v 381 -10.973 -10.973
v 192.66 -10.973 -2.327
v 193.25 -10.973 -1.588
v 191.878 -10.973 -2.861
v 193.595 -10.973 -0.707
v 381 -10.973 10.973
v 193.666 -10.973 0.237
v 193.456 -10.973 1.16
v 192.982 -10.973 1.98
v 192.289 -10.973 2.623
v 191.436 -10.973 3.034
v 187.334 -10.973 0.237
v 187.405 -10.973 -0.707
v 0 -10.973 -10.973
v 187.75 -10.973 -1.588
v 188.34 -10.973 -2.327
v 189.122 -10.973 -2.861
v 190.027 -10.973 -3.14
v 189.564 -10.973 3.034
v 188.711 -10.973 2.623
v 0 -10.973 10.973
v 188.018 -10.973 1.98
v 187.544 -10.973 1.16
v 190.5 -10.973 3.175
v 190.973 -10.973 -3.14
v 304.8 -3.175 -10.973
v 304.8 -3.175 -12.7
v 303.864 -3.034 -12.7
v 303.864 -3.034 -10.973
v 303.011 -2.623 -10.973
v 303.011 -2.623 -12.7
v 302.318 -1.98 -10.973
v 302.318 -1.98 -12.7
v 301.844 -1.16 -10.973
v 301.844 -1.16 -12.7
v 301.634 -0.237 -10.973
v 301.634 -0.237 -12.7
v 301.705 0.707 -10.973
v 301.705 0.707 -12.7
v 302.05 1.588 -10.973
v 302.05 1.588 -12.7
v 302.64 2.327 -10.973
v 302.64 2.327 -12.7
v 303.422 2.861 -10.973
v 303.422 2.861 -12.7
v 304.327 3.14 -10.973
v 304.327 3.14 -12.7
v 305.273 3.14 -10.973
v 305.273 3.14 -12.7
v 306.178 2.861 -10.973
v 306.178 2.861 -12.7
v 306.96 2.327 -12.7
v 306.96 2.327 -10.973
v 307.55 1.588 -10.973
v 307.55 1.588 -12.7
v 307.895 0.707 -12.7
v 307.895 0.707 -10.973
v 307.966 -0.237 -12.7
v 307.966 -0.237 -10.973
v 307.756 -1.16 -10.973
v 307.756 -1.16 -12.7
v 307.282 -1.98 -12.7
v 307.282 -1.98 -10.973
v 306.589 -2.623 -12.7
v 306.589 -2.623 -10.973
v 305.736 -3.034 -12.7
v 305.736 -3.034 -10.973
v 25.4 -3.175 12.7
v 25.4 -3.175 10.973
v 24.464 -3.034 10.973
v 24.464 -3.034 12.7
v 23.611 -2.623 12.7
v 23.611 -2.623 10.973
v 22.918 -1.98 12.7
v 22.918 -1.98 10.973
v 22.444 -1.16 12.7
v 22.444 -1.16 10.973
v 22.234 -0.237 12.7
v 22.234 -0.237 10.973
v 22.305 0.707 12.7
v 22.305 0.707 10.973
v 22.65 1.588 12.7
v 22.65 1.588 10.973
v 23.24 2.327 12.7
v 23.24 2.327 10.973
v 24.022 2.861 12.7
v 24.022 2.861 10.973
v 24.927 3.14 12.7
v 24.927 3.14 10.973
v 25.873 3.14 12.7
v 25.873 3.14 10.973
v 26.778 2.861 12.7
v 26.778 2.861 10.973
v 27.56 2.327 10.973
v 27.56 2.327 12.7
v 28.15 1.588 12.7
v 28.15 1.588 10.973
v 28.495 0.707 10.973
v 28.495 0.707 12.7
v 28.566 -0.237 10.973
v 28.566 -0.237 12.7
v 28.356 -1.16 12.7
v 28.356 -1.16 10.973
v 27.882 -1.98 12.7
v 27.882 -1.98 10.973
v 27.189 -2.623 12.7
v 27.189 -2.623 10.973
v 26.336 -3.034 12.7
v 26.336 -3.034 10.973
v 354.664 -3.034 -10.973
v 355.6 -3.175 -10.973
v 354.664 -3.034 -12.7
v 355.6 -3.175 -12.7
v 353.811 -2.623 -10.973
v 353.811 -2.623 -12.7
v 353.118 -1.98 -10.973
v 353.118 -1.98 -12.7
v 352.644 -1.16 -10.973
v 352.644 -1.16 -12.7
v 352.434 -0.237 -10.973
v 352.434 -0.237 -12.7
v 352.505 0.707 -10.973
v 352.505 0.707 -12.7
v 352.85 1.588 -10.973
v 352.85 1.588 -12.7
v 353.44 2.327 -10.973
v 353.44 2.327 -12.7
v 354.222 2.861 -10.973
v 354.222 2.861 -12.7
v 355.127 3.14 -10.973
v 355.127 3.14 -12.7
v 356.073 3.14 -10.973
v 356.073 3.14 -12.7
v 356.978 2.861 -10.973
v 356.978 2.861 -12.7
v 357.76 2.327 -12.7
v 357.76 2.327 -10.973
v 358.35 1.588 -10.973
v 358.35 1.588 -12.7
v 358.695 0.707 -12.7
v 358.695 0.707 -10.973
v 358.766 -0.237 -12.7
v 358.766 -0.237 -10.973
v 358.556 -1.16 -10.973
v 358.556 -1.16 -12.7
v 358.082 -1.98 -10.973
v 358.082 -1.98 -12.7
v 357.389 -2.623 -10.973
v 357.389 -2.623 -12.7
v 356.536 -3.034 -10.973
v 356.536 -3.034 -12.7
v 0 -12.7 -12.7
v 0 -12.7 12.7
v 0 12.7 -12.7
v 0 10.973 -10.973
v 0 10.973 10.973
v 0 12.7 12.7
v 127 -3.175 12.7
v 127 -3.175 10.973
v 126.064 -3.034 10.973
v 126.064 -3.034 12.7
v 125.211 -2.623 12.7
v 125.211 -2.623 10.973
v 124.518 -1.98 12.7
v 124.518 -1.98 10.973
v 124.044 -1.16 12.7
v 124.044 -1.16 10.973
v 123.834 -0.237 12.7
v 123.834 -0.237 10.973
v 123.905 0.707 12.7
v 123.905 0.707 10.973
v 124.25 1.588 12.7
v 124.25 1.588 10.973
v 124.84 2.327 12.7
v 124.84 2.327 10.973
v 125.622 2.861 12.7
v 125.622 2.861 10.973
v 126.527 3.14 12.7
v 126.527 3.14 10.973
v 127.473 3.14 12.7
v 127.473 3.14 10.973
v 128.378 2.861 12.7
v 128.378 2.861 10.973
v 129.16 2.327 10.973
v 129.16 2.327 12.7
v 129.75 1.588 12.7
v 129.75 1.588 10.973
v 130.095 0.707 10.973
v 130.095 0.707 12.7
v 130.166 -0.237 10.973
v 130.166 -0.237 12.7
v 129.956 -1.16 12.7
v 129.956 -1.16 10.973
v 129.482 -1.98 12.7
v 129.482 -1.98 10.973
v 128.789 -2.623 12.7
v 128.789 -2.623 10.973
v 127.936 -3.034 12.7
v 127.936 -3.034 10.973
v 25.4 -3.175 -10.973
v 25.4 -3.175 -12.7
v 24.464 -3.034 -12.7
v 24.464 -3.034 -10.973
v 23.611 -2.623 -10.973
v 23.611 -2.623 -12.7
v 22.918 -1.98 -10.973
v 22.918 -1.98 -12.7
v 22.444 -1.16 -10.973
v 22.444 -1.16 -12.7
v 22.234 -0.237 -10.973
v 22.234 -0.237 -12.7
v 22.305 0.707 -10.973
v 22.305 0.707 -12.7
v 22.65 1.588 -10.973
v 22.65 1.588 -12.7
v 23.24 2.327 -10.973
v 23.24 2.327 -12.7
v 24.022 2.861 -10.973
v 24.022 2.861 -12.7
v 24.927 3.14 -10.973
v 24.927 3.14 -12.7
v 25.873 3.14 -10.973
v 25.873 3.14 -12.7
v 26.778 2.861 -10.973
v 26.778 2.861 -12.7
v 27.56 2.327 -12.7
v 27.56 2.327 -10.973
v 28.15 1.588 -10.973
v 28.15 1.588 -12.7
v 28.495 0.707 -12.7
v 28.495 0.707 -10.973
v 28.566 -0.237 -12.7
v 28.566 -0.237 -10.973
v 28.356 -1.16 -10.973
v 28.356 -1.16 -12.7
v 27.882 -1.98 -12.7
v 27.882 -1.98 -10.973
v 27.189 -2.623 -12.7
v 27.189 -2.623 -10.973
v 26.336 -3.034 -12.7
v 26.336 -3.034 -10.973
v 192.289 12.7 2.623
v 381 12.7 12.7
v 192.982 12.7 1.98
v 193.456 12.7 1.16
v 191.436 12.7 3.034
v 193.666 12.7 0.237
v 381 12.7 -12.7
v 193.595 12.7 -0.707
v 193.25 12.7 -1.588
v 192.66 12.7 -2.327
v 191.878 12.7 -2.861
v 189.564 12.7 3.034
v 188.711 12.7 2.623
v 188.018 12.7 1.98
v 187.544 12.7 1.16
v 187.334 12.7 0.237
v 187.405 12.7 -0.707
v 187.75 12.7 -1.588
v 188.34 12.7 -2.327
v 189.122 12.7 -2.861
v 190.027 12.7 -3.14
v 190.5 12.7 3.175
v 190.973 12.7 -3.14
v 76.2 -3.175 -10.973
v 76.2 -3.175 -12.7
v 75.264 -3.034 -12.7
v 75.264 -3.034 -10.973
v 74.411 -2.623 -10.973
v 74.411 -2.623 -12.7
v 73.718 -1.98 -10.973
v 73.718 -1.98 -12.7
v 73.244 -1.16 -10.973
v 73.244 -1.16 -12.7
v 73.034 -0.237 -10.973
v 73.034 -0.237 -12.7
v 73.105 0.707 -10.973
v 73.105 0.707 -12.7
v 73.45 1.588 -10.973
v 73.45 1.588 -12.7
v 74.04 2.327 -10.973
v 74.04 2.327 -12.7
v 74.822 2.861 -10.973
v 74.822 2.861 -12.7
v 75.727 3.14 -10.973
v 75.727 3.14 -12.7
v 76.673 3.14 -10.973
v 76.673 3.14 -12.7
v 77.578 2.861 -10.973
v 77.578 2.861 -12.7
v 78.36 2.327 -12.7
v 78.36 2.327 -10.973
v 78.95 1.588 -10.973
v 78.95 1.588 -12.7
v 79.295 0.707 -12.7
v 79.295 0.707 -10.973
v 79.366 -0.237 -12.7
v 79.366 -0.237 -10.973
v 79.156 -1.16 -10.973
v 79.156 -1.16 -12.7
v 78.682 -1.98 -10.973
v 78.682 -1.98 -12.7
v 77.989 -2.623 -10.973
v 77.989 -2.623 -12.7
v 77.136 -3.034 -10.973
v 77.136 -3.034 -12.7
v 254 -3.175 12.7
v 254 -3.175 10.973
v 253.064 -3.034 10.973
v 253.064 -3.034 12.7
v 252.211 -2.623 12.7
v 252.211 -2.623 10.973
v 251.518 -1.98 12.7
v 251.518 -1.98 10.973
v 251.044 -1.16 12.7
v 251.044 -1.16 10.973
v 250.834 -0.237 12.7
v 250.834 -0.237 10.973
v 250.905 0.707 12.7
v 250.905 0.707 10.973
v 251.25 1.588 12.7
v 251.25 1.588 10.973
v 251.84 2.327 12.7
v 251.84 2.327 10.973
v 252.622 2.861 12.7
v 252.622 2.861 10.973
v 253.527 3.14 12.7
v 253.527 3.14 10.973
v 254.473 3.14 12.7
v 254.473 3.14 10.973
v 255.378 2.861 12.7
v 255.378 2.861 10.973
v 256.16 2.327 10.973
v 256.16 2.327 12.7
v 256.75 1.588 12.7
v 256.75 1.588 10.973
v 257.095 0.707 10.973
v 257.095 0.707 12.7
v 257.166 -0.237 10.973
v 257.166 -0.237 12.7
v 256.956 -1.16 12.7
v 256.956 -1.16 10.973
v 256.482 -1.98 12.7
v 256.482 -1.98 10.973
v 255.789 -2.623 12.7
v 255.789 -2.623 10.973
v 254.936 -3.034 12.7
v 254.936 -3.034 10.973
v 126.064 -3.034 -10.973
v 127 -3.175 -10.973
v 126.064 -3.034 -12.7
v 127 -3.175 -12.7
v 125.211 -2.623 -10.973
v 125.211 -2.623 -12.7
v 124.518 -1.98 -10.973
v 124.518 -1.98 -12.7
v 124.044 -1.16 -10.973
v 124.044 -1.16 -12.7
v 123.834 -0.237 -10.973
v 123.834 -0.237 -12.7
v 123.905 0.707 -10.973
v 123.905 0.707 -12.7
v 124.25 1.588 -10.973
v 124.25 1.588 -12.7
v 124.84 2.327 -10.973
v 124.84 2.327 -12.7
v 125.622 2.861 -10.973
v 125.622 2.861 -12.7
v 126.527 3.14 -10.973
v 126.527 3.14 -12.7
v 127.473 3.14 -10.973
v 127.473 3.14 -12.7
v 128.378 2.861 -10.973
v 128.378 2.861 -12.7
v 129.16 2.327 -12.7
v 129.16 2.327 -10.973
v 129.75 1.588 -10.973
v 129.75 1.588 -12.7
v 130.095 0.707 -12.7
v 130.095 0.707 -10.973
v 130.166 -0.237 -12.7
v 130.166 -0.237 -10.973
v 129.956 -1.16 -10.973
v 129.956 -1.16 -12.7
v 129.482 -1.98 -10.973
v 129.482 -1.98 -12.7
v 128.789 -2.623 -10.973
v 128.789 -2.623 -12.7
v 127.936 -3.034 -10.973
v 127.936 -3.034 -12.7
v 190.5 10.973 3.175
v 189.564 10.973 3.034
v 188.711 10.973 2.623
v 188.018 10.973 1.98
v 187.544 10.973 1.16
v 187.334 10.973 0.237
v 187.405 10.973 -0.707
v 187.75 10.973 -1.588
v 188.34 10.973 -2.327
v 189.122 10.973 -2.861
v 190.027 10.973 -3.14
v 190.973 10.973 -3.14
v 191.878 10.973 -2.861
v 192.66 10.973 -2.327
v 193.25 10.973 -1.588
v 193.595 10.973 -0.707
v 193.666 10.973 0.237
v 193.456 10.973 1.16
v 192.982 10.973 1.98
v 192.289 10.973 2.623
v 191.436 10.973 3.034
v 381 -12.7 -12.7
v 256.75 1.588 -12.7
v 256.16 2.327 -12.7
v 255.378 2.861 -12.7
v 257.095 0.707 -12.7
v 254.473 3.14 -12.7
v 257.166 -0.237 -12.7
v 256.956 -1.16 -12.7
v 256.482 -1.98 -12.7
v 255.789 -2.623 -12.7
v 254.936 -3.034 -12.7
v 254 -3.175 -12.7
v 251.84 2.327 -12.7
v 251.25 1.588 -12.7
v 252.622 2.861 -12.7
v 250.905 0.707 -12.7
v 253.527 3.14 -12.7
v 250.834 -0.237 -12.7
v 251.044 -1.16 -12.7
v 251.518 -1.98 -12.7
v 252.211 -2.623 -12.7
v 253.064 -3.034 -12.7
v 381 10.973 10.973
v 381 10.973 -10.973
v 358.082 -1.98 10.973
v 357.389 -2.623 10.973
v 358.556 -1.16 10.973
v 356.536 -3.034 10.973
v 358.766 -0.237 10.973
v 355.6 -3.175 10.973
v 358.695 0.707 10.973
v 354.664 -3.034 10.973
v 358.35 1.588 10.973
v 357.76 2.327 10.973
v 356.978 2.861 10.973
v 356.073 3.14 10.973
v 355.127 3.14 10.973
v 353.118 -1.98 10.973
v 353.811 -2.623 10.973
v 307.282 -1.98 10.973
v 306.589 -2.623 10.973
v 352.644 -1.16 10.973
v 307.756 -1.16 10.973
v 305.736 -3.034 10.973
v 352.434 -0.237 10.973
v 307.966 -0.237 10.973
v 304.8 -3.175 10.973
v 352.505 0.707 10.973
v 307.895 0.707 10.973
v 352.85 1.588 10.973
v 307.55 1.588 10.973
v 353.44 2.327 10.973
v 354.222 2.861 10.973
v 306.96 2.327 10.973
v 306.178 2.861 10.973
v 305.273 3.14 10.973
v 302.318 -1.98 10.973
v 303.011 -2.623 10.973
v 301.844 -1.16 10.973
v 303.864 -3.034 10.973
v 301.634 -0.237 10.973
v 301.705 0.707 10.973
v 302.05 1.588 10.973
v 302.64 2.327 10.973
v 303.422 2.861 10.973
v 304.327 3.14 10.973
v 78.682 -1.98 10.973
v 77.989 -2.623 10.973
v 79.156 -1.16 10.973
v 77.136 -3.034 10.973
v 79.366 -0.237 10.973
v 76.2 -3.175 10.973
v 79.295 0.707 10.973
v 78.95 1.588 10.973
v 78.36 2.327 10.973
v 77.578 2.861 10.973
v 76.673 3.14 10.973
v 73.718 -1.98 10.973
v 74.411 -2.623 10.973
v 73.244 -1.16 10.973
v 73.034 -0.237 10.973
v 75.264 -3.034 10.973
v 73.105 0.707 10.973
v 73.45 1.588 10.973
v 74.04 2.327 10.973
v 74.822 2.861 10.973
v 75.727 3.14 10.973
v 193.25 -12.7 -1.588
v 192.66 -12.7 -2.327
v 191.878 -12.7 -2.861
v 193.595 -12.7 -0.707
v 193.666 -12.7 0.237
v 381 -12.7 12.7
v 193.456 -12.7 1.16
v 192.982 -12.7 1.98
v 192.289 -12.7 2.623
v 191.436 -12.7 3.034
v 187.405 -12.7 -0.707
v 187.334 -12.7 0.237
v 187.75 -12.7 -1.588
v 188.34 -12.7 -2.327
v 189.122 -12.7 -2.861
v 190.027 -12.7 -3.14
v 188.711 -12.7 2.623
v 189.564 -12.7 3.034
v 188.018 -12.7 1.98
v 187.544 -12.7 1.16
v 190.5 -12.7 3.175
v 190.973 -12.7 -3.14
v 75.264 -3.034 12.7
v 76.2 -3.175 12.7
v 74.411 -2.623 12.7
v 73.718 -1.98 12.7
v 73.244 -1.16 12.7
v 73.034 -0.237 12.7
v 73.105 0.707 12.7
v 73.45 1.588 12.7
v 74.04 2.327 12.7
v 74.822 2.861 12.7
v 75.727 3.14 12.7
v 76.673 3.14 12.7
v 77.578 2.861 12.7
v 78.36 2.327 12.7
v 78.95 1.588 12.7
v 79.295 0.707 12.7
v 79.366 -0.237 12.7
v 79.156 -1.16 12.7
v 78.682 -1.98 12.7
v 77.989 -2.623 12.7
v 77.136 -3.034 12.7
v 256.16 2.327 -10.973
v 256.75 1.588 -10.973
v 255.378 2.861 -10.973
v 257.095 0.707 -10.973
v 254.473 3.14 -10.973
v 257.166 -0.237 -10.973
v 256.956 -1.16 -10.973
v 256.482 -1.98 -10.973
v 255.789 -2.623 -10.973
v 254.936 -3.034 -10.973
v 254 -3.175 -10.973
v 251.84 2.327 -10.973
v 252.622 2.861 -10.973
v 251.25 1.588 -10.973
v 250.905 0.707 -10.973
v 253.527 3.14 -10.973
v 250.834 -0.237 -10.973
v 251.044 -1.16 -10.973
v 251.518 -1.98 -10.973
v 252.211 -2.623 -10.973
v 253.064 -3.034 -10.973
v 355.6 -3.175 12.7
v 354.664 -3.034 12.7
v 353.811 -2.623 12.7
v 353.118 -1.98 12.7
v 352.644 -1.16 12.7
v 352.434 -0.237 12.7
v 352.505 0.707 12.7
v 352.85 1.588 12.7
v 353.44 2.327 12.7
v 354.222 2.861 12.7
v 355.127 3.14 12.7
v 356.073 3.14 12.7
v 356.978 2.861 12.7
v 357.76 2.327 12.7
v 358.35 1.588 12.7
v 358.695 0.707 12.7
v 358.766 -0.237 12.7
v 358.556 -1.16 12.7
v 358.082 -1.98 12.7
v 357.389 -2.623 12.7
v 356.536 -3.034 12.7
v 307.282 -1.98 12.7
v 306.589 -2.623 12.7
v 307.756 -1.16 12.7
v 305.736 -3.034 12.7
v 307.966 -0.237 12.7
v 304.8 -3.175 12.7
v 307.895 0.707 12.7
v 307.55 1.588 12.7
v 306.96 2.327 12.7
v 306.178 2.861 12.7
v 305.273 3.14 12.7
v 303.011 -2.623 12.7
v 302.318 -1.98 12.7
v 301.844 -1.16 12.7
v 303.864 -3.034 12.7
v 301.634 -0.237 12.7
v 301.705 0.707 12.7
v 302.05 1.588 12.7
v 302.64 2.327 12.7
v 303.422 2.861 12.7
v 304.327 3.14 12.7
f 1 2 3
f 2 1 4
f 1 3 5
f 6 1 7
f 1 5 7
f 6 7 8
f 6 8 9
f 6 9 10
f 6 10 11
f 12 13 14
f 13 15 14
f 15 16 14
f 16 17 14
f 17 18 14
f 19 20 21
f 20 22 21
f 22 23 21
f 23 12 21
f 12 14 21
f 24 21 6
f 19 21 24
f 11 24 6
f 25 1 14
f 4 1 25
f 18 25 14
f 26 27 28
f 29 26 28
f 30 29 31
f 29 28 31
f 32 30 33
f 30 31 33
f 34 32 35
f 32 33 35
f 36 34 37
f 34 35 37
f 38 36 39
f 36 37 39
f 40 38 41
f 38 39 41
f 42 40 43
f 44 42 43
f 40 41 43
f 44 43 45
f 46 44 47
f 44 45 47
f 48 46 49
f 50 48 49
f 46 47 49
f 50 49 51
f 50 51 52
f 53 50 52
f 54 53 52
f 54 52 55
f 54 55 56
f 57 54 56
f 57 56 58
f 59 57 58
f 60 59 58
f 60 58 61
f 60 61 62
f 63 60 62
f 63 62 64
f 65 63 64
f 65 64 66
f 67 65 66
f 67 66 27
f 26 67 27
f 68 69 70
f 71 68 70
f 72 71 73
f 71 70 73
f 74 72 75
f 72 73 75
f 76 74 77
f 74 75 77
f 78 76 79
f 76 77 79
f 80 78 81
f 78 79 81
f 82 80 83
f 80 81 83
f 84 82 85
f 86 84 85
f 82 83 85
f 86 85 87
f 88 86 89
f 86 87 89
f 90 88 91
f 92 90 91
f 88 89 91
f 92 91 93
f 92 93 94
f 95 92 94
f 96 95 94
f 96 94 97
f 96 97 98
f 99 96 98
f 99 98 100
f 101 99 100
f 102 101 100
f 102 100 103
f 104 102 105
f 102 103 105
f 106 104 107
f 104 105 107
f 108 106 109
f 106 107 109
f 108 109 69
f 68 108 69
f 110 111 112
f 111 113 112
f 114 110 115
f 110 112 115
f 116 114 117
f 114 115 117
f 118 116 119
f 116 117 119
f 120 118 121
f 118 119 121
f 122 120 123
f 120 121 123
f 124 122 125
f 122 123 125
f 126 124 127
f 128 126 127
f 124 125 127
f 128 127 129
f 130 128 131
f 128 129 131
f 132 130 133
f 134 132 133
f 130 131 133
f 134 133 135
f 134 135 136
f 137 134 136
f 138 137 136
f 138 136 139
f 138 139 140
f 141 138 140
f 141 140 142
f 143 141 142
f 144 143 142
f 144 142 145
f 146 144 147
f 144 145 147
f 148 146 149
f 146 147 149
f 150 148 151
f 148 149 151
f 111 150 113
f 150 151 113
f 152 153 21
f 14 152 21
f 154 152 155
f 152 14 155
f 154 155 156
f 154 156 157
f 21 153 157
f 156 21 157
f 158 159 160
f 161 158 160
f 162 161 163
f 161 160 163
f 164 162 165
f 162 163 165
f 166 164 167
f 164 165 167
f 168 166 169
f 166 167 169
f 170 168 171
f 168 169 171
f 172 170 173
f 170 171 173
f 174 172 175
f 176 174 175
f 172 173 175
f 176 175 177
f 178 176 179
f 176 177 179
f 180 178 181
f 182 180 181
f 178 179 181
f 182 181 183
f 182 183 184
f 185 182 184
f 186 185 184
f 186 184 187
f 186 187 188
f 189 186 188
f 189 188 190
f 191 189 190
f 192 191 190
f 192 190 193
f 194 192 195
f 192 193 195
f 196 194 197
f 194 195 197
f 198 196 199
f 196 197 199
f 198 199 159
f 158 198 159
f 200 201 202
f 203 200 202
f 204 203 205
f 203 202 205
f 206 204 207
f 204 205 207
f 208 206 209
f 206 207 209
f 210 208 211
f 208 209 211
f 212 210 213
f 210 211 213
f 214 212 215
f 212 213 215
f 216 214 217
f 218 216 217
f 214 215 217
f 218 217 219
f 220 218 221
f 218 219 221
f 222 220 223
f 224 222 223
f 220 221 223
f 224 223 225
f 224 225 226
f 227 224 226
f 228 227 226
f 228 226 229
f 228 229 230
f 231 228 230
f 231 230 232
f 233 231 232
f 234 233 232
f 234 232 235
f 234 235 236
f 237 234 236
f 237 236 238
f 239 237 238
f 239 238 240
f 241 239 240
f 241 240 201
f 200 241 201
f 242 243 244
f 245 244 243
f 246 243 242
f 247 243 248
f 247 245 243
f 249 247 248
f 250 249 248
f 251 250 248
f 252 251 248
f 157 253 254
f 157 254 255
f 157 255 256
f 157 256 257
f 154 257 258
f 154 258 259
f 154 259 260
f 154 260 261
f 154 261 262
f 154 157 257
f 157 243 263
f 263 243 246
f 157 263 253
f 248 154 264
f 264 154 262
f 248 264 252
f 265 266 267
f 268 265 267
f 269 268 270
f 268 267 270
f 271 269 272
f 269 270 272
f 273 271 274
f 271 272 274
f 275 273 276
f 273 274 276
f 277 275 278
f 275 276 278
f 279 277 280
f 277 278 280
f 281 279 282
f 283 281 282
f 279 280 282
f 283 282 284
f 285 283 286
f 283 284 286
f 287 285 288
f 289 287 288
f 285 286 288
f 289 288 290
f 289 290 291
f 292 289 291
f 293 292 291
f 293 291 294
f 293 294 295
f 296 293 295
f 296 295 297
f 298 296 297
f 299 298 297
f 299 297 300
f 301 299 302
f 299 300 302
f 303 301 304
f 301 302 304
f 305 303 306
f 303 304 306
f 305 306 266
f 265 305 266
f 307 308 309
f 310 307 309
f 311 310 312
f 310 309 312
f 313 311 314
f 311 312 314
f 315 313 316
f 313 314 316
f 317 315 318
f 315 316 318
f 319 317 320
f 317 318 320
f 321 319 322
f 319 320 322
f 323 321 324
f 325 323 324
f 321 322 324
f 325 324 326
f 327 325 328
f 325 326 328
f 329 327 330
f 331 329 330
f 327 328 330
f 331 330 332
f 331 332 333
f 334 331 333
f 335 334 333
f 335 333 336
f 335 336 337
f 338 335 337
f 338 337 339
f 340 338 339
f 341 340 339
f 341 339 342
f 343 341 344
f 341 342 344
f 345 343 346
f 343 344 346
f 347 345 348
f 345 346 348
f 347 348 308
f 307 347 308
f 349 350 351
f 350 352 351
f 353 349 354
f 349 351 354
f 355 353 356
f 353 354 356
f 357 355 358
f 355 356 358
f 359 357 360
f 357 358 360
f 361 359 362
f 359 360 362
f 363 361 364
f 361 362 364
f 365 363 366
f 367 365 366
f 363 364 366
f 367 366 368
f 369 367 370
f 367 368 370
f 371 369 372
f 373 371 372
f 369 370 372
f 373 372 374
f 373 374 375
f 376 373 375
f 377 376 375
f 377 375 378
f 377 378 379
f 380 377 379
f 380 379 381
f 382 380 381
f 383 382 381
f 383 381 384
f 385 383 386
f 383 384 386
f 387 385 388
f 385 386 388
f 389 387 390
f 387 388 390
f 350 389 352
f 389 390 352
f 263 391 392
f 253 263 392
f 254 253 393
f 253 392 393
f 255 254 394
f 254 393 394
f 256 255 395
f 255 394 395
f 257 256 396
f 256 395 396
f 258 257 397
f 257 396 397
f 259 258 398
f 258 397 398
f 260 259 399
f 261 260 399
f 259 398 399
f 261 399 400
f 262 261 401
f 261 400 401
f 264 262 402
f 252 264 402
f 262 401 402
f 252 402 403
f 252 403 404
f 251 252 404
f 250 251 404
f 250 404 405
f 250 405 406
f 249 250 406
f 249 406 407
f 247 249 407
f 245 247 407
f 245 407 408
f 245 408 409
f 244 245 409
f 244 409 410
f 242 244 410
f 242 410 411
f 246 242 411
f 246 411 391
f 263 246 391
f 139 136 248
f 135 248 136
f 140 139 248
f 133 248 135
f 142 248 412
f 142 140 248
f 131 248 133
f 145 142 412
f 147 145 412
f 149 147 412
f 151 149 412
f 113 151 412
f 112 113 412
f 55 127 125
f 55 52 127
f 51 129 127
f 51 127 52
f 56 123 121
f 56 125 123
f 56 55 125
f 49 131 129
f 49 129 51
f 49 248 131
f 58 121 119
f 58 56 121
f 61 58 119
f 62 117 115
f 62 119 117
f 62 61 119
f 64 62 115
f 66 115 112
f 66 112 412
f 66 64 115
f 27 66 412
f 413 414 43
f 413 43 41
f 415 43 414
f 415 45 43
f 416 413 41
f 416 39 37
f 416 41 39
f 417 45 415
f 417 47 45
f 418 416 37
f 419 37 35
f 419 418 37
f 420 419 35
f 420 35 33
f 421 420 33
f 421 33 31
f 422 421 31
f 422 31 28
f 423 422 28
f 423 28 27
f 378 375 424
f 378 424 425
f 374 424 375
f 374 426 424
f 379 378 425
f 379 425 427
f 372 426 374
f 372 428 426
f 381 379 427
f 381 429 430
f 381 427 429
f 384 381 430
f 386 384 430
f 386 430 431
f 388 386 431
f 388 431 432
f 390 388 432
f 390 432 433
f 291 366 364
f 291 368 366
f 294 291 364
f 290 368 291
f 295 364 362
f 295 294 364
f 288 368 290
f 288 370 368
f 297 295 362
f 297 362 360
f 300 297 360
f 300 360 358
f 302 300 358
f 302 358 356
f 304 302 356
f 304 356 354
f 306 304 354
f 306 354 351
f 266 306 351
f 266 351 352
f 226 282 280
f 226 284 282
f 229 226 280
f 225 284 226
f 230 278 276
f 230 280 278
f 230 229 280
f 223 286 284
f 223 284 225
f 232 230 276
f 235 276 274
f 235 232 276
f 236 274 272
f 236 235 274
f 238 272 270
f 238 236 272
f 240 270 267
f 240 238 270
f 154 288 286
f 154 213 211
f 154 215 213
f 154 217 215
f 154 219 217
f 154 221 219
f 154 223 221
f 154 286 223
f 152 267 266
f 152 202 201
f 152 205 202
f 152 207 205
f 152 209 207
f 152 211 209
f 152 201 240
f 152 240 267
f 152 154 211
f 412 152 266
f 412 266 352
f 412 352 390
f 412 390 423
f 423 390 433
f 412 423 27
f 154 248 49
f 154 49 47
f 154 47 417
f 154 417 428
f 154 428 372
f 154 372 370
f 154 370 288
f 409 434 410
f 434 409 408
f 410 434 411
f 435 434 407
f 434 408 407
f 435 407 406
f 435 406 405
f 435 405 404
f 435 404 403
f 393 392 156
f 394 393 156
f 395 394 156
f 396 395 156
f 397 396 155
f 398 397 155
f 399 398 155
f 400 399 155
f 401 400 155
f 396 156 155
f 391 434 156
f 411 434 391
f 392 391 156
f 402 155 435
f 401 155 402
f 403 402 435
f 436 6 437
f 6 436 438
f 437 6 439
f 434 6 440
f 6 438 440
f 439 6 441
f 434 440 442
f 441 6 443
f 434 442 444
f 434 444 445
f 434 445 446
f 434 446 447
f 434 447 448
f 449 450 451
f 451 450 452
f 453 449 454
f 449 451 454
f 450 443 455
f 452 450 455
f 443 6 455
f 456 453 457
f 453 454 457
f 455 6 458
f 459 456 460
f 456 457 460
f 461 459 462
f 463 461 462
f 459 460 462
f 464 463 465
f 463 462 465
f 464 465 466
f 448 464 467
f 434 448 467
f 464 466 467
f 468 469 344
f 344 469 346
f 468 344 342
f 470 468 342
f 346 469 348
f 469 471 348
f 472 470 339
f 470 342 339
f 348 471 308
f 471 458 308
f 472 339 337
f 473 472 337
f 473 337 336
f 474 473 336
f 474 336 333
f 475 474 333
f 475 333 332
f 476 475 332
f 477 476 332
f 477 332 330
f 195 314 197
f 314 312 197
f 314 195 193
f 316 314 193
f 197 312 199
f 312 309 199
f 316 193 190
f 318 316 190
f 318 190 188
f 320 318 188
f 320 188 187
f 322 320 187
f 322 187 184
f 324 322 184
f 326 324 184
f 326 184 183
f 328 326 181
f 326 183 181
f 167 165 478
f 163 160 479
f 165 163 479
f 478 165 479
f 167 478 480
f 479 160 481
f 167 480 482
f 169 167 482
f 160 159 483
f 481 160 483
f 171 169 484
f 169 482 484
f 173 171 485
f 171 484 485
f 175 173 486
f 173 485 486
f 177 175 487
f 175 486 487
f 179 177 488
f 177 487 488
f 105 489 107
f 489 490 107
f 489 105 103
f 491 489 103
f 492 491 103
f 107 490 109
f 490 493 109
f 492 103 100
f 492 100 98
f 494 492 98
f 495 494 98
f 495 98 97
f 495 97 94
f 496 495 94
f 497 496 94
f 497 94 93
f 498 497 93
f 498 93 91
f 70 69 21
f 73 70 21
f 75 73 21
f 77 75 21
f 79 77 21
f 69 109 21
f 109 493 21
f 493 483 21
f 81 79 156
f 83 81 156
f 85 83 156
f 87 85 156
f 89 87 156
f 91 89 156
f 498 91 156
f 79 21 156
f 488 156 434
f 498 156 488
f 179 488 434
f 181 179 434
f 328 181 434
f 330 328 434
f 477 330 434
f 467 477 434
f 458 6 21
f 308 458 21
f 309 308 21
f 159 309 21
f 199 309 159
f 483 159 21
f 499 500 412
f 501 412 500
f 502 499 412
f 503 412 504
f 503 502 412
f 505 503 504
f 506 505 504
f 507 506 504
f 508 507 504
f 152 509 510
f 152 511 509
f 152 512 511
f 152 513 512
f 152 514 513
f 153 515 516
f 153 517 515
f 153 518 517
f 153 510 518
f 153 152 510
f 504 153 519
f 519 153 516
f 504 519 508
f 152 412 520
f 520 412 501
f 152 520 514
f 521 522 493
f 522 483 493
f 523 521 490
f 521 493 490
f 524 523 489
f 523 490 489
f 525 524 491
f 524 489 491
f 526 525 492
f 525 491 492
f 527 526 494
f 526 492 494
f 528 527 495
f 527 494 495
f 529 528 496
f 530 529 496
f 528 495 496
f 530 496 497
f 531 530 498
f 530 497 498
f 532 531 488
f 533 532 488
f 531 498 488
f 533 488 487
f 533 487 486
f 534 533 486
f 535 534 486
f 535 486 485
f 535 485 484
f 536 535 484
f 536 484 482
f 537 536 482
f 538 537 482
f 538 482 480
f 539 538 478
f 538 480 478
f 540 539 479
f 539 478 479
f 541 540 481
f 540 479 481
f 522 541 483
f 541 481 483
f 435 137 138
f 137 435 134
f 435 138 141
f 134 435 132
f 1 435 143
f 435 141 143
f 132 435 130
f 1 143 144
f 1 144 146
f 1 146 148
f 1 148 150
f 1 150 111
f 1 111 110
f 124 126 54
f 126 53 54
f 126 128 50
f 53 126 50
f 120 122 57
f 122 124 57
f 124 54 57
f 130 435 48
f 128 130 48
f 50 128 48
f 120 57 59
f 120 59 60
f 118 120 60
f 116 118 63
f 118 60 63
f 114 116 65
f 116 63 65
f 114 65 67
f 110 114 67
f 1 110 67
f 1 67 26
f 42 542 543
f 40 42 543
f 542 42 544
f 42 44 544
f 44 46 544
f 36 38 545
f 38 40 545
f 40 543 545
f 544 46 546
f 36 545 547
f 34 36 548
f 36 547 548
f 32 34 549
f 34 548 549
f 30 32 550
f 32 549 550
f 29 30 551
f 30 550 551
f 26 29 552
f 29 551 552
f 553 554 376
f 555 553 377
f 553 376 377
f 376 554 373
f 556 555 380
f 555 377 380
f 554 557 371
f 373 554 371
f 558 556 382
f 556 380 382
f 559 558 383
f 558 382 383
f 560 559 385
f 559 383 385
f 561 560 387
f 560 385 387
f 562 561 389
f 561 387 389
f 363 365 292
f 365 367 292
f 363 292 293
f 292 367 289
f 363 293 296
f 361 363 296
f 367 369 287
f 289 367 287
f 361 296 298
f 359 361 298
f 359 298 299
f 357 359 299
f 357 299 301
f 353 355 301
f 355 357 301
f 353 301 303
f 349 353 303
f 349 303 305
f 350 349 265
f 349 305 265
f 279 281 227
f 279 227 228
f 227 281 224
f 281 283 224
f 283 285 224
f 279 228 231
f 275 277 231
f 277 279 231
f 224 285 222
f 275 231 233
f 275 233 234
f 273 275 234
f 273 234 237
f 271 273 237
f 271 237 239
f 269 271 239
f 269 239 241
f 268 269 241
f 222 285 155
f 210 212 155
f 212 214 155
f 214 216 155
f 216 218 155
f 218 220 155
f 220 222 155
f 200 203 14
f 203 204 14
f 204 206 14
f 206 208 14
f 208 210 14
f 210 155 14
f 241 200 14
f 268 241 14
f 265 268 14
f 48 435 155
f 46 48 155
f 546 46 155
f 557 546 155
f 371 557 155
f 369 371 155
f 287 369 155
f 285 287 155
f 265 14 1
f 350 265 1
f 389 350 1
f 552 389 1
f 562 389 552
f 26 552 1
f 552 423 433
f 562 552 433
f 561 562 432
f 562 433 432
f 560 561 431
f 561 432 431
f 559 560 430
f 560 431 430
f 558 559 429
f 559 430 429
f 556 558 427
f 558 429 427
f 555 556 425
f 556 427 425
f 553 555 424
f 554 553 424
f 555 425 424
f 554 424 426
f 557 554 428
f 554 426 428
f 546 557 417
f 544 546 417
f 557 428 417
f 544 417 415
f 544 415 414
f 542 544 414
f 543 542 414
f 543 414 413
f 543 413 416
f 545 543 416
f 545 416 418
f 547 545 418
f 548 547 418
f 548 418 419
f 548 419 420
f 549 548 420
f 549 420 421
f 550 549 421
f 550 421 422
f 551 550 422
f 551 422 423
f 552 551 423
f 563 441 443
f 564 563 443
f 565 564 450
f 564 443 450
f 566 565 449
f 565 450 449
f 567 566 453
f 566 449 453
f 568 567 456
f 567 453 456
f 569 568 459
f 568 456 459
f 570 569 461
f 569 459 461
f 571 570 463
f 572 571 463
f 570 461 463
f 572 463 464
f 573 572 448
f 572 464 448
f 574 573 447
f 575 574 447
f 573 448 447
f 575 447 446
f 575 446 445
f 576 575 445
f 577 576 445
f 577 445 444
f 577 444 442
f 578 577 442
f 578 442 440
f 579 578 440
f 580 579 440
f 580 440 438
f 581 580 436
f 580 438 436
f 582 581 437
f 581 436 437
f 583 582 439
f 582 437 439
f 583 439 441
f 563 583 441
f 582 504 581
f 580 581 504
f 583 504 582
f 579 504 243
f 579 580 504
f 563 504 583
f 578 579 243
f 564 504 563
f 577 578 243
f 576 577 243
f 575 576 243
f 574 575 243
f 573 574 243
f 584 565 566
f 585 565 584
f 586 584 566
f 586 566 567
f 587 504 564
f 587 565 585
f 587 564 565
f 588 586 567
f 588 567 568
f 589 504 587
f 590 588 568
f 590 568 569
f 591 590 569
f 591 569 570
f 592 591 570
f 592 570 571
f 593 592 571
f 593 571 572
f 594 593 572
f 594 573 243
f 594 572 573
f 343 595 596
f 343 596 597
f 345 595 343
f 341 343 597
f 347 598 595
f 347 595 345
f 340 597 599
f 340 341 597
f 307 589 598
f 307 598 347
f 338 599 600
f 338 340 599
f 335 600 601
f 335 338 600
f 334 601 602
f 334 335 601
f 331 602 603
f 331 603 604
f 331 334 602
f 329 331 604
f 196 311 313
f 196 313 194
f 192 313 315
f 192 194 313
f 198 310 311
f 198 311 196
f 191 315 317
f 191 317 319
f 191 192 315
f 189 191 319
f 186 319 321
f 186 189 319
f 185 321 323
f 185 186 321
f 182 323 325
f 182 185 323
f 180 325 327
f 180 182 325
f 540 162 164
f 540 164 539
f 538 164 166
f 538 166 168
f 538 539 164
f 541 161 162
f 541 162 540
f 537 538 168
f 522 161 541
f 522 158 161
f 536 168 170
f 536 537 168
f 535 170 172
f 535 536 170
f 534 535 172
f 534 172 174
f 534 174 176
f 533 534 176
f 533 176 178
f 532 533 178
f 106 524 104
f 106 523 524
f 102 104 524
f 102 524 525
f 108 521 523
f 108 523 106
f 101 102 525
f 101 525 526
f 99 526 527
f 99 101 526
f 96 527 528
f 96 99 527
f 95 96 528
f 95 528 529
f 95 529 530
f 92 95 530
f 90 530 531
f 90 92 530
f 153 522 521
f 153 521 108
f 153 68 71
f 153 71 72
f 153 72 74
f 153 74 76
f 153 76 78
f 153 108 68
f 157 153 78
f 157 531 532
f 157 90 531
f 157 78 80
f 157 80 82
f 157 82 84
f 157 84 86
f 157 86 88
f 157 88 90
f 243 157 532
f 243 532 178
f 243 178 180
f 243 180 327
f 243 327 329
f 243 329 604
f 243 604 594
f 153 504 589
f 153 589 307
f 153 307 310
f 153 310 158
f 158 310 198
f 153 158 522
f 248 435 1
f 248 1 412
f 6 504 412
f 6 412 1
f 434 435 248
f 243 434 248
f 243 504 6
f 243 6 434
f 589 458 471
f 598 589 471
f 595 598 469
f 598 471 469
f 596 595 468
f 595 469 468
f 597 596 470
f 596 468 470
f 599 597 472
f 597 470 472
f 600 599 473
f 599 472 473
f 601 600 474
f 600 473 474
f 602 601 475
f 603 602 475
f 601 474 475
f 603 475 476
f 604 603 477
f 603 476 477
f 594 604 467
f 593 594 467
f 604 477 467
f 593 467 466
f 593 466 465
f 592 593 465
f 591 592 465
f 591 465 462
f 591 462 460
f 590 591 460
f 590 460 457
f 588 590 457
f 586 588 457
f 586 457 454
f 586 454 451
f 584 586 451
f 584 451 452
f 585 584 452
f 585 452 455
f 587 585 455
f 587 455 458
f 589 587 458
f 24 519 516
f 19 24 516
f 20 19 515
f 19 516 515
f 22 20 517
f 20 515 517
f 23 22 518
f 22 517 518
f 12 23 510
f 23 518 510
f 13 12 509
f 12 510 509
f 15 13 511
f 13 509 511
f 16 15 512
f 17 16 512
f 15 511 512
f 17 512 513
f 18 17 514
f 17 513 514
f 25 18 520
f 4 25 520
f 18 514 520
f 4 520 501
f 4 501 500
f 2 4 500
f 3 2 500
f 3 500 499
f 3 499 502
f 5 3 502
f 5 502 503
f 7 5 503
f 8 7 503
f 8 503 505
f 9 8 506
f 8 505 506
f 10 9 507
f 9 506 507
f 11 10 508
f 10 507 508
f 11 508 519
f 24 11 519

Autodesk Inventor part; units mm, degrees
ref_plane "YZ Plane" through (0, 0, 0) normal (1, 0, 0) x (0, 1, 0)
ref_plane "XZ Plane" through (0, 0, 0) normal (0, 1, 0) x (-1, 0, 0)
ref_plane "XY Plane" through (0, 0, 0) normal (0, 0, 1) x (1, 0, 0)
sketch "Sketch1" plane through (0, 0, 0) normal (1, 0, 0) x (0, 1, 0)
  line L0 (-10.9728, 10.9728) -> (10.9728, 10.9728)
  line L1 (10.9728, 10.9728) -> (10.9728, -10.9728)
  line L2 (10.9728, -10.9728) -> (-10.9728, -10.9728)
  line L3 (-10.9728, -10.9728) -> (-10.9728, 10.9728)
  line L4 (-10.9728, 10.9728) -> (10.9728, -10.9728) construction
  line L5 (10.9728, 10.9728) -> (-10.9728, -10.9728) construction
  line L6 (-12.7, 12.7) -> (12.7, 12.7)
  line L7 (12.7, 12.7) -> (12.7, -12.7)
  line L8 (12.7, -12.7) -> (-12.7, -12.7)
  line L9 (-12.7, -12.7) -> (-12.7, 12.7)
  line L10 (-12.7, 12.7) -> (12.7, -12.7) construction
  line L11 (12.7, 12.7) -> (-12.7, -12.7) construction
  point P0 (0, 0)
  dimension "d2" = 1.7272
  dimension "d4" = 1.7272
  dimension "d5" = 25.4
  dimension "d6" = 25.4
extrude "Extrusion1" add sketch "Sketch1" along normal blind 381
sketch "Sketch2" plane through (0, -12.7, 12.7) normal (0, 0, 1) x (1, 0, 0)
  line L0 (0, 0) -> (0, 25.4) projected
  line L1 (381, 25.4) -> (381, 0) projected
  line L2 (0, 25.4) -> (381, 25.4) projected
  point P0 (0, 12.7)
  point P1 (25.4, 12.7)
  point P2 (355.6, 12.7)
  dimension "d9" = 25.4
  dimension "d10" = 12.7
  dimension "d11" = 25.4
  dimension "d12" = 12.7
hole "Hole1" at (25.4, 0, 12.7) at (355.6, 0, 12.7) direction (0, 0, -1) diameter 6.35 end through all
sketch "Sketch3" plane through (0, -12.7, 12.7) normal (0, 0, 1) x (1, 0, 0)
  line L0 (0, 0) -> (381, 0) projected
  line L1 (381, 25.4) -> (381, 0) projected
  line L2 (0, 25.4) -> (381, 25.4) projected
  line L3 (101.6, 25.4) -> (101.6, 0)
  line L4 (279.4, 25.4) -> (279.4, 0)
  line L5 (190.5, 25.4) -> (190.5, 0)
  point P0 (0, 12.7)
  point P1 (76.2, 12.7)
  point P2 (127, 12.7)
  point P3 (511.7916, 13.2861)
  point P4 (652.1971, 7.6456)
  point P5 (254, 12.7)
  point P6 (304.8, 12.7)
  dimension "d20" = 50.8
  dimension "d22" = 12.7
  dimension "d23" = 12.7
  dimension "d24" = 50.8
  dimension "d25" = 12.7
  dimension "d26" = 12.7
  dimension "d27" = 25.4
  dimension "d28" = 25.4
  dimension "d29" = 177.8
  dimension "d30" = 88.9
  dimension "d31" = 381
  dimension "d32" = 190.5
hole "Hole2" at (76.2, 0, 12.7) at (127, 0, 12.7) at (511.7916, 0.5861, 12.7) at (652.1971, -5.0544, 12.7) at (254, 0, 12.7) at (304.8, 0, 12.7) direction (0, 0, -1) diameter 6.35 end through all
sketch "Sketch4" plane through (0, 12.7, 12.7) normal (0, 1, 0) x (1, 0, 0)
  line L0 (381, 25.4) -> (381, 0) projected
  line L1 (0, 25.4) -> (381, 25.4) projected
  point P0 (0, 12.7)
  point P1 (190.5, 12.7)
  dimension "d40" = 12.7
  dimension "d41" = 190.5
hole "Hole3" at (190.5, 12.7, 0) direction (0, -1, 0) diameter 6.35 end through all
properties part number "BackBottonSupport" material "Aluminum 6061"
